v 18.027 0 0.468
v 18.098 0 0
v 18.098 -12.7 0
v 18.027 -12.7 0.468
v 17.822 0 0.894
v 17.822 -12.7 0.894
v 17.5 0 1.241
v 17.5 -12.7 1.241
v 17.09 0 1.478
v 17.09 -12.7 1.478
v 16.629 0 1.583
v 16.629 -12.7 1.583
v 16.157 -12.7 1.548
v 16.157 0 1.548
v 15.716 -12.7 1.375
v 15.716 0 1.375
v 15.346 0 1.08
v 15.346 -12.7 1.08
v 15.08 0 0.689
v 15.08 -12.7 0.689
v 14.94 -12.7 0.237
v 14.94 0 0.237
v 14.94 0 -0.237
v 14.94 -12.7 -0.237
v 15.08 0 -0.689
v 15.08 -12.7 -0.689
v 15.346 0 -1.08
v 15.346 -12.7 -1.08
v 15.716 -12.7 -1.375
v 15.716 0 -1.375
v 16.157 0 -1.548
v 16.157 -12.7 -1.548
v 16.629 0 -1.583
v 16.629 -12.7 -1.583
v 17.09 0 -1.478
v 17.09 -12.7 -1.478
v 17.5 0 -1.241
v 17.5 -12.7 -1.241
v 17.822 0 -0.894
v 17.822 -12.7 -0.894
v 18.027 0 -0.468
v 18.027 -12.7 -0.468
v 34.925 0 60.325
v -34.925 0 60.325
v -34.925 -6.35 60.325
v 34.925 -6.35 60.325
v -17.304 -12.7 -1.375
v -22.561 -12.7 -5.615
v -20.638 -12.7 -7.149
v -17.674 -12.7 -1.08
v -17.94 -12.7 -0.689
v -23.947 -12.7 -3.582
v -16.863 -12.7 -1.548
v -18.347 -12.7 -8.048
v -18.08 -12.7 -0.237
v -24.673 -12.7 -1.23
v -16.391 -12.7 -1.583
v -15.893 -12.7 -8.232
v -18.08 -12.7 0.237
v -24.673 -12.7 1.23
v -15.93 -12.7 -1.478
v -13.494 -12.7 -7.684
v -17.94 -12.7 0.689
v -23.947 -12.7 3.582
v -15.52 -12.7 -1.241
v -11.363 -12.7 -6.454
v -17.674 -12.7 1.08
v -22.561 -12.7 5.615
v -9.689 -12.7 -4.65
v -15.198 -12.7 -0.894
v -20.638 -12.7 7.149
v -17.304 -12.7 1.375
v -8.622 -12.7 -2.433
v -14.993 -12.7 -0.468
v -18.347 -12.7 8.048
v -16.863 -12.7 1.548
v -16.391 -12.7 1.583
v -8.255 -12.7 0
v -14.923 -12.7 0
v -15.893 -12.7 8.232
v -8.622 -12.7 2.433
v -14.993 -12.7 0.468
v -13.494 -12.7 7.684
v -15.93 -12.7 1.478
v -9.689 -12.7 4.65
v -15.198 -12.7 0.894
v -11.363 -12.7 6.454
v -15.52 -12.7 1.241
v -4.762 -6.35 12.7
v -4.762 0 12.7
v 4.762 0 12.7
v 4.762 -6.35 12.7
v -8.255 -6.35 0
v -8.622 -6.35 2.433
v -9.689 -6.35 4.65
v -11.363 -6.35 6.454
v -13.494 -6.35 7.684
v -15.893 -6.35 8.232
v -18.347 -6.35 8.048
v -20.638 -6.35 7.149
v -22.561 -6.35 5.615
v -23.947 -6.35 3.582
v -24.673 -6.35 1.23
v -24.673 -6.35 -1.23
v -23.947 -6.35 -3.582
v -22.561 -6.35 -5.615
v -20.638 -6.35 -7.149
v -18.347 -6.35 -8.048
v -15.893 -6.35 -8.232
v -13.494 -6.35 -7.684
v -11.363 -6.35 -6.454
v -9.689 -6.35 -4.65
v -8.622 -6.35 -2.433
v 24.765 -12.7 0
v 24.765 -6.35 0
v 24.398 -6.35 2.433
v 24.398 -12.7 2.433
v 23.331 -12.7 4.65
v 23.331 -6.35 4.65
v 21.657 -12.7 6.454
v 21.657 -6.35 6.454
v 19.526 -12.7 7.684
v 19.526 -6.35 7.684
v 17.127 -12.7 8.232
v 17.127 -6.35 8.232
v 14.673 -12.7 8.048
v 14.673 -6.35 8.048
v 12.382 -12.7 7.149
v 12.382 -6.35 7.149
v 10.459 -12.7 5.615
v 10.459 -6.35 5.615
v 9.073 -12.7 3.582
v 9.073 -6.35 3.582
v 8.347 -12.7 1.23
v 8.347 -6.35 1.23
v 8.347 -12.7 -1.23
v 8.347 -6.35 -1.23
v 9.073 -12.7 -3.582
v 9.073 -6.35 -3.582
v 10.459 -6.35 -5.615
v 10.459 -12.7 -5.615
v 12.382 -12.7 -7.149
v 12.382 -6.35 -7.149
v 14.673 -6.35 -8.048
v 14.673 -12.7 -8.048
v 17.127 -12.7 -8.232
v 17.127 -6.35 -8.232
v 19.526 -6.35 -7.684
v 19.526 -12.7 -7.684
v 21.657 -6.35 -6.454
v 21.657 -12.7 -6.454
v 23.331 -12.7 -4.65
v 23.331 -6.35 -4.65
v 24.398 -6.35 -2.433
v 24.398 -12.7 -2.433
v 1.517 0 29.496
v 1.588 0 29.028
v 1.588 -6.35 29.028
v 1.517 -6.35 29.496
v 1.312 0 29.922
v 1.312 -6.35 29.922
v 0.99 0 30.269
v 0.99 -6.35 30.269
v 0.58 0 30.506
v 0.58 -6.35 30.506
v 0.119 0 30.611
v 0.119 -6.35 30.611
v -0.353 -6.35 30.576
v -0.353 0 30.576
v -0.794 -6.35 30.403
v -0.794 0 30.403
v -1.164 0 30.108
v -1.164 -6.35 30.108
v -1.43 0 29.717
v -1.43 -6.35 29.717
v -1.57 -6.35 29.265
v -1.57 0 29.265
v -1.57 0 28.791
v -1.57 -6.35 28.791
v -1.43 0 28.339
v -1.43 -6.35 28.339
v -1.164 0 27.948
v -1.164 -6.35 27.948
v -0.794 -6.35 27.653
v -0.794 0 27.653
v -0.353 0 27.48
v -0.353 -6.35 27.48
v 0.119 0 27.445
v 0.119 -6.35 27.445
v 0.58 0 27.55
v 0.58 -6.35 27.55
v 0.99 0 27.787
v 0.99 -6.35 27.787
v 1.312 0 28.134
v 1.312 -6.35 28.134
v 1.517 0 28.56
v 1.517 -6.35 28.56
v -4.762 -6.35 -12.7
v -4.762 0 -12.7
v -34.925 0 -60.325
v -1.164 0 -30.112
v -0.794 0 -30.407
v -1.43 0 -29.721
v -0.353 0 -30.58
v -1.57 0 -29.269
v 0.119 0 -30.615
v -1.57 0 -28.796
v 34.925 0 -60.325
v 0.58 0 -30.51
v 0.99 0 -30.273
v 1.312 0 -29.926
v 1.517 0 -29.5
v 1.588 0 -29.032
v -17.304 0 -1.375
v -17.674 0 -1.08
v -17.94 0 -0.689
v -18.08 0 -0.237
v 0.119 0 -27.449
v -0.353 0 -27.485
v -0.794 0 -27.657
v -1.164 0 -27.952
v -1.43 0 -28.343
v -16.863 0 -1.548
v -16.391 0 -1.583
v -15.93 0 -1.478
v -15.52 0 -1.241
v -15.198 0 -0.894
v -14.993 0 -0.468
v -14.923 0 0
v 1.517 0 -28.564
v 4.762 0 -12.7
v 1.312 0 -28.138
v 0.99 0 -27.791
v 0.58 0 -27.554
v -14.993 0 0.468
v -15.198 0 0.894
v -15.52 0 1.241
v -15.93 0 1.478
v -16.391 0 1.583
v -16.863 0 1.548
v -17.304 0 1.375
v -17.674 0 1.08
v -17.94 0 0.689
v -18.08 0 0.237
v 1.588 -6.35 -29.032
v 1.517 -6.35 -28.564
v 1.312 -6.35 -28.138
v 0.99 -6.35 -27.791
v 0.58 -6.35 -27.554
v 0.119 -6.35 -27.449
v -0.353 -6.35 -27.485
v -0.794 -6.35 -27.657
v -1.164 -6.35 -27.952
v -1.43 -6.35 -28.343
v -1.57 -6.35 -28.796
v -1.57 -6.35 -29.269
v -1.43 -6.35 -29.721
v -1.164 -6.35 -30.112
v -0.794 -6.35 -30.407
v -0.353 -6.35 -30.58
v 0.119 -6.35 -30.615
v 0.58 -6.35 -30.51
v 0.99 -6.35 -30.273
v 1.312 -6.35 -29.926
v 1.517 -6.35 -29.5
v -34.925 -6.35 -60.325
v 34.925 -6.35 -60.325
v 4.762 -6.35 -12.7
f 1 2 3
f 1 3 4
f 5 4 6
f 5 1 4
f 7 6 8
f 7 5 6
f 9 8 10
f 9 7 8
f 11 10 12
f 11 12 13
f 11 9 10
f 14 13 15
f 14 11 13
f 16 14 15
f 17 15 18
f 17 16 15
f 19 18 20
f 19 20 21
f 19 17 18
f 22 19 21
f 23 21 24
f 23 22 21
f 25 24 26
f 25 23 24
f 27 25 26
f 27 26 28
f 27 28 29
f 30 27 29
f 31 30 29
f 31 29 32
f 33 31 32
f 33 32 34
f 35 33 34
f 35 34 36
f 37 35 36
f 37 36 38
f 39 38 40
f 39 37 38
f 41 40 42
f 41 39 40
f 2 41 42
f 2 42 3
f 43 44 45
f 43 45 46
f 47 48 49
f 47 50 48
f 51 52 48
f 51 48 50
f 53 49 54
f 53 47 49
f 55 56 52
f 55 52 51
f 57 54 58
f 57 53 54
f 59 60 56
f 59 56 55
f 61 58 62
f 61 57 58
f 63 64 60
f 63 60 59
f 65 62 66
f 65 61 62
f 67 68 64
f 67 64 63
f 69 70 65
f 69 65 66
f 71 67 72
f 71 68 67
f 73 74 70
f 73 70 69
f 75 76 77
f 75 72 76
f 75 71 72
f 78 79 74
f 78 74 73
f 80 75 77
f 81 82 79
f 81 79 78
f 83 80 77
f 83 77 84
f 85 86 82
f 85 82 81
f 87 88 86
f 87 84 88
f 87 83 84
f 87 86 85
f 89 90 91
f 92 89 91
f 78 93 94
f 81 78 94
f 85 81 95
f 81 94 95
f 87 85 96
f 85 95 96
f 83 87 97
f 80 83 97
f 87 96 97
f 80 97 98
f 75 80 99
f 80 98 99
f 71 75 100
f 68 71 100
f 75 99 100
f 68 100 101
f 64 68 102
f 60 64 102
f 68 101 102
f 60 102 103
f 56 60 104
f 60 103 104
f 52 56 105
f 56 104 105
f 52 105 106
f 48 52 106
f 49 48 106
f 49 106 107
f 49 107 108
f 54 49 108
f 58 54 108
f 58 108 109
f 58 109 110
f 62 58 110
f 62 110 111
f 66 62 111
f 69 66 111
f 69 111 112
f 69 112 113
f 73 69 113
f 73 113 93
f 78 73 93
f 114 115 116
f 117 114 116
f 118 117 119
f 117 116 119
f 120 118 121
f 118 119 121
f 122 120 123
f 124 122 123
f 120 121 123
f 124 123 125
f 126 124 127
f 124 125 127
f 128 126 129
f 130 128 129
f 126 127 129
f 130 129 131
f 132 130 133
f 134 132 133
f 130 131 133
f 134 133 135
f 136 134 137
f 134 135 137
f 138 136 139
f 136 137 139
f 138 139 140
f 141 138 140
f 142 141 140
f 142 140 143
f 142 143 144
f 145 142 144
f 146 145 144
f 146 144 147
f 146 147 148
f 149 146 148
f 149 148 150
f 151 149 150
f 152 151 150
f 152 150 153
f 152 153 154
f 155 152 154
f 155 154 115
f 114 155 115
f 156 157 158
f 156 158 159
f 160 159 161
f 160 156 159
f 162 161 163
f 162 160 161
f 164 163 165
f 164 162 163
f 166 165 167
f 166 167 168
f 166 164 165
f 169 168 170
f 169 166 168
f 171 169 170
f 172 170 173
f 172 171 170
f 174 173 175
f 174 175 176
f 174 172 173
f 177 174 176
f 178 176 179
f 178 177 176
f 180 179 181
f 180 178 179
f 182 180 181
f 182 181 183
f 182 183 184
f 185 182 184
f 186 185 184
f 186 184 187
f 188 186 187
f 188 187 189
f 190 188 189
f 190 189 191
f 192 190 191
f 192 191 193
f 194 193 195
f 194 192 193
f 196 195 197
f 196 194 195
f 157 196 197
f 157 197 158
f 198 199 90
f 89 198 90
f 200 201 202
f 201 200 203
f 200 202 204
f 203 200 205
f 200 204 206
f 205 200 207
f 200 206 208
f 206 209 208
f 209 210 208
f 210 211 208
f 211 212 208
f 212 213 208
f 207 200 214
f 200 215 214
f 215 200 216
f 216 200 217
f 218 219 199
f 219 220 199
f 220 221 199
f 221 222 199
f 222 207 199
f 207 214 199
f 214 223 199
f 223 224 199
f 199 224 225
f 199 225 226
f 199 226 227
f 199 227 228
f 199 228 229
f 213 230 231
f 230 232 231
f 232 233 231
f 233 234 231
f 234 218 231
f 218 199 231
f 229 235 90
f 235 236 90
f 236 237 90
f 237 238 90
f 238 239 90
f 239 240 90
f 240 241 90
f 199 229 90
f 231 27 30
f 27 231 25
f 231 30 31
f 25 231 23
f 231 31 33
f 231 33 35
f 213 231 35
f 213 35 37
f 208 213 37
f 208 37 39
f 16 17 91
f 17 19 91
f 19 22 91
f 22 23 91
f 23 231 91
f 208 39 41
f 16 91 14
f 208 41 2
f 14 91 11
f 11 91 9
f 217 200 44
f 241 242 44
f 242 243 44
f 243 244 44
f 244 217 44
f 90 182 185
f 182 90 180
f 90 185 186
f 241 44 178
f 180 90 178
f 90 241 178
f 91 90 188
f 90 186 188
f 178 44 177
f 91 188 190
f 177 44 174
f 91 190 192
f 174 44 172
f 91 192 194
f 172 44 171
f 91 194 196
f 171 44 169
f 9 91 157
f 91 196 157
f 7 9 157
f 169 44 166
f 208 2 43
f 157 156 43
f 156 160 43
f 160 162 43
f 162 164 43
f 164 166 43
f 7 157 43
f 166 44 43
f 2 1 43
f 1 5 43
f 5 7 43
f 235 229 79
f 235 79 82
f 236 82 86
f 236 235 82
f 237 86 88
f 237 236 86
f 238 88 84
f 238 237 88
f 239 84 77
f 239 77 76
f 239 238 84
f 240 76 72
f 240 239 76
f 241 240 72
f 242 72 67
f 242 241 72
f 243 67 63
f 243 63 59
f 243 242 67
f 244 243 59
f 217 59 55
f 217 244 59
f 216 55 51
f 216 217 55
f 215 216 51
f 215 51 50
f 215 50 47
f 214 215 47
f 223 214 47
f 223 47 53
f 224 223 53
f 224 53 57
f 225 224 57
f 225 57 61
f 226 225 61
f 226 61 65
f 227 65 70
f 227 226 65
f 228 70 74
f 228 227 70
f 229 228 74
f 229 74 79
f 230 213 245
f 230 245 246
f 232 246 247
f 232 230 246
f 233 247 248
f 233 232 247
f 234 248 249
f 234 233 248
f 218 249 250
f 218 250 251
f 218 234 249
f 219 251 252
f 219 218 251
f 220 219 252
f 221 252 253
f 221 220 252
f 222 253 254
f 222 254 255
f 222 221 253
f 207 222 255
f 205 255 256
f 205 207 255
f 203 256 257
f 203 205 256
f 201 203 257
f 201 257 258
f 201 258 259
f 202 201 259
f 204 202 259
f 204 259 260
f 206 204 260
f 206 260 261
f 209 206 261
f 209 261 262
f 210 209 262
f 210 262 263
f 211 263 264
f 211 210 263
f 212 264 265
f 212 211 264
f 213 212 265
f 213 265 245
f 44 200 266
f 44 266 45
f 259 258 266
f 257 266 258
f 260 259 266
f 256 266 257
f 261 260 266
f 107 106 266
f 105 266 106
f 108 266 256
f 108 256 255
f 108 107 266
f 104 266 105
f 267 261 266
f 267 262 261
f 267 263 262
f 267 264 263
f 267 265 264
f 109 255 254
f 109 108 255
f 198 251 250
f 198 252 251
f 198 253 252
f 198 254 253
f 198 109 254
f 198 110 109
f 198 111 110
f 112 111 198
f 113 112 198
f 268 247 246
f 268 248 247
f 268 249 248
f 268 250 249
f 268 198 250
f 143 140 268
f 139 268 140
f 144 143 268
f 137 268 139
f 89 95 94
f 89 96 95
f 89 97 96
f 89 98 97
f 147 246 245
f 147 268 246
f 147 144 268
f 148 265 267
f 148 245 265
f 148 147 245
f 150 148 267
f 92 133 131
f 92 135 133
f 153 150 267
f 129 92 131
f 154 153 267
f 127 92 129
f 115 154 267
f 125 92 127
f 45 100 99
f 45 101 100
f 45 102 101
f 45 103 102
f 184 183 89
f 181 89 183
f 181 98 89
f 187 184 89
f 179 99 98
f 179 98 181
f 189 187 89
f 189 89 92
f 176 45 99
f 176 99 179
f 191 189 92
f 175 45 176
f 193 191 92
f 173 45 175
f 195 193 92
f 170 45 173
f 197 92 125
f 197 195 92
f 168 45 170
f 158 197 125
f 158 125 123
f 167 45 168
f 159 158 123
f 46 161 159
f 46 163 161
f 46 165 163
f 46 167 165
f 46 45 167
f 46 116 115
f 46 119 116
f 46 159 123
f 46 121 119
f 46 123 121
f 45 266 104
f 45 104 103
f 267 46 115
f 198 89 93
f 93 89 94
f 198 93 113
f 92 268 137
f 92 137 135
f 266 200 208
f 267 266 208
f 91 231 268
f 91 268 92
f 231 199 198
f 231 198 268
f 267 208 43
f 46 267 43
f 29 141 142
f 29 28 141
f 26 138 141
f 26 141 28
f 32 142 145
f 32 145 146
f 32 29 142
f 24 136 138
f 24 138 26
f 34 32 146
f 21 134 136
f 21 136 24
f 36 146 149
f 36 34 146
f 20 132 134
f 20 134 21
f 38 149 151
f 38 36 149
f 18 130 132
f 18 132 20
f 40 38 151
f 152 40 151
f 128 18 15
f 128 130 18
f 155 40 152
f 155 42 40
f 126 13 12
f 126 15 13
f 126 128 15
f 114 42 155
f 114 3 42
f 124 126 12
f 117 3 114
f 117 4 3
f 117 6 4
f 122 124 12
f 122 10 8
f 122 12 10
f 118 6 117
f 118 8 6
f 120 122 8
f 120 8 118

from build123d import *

# Parameters (mm, degrees)
F0_W     = 69.85
F0_H     = 120.65
F0_R     = 1.5875
F0_R_2   = 8.255
F0_W_2   = 9.525
F0_H_2   = 25.4
F1_DEPTH = 6.35
F2_DEPTH = 12.7
F3_DEPTH = 12.7


with BuildPart() as f1:
    # F0 (on Front) → F1 (new body)
    with BuildSketch(Plane.XZ):
        Rectangle(F0_W, F0_H)
        with Locations((0, -29.0322)):
            Circle(F0_R, mode=Mode.SUBTRACT)
        with Locations((-16.51, 0)):
            Circle(F0_R_2, mode=Mode.SUBTRACT)
        Rectangle(F0_W_2, F0_H_2, mode=Mode.SUBTRACT)
        with Locations((16.51, 0)):
            Circle(F0_R_2, mode=Mode.SUBTRACT)
        with Locations((0, 29.028019)):
            Circle(F0_R, mode=Mode.SUBTRACT)
    extrude(amount=F1_DEPTH)

    # F0 (on Front) → F2 (join)
    with BuildSketch(Plane.XZ):
        with Locations((-16.51, 0)):
            Circle(F0_R_2)
        with Locations((-16.51, 0)):
            Circle(F0_R, mode=Mode.SUBTRACT)
    extrude(amount=F2_DEPTH)

    # F0 (on Front) → F3 (join)
    with BuildSketch(Plane.XZ):
        with Locations((16.51, 0)):
            Circle(F0_R_2)
        with Locations((16.51, 0)):
            Circle(F0_R, mode=Mode.SUBTRACT)
    extrude(amount=F3_DEPTH)


solid = f1.part
